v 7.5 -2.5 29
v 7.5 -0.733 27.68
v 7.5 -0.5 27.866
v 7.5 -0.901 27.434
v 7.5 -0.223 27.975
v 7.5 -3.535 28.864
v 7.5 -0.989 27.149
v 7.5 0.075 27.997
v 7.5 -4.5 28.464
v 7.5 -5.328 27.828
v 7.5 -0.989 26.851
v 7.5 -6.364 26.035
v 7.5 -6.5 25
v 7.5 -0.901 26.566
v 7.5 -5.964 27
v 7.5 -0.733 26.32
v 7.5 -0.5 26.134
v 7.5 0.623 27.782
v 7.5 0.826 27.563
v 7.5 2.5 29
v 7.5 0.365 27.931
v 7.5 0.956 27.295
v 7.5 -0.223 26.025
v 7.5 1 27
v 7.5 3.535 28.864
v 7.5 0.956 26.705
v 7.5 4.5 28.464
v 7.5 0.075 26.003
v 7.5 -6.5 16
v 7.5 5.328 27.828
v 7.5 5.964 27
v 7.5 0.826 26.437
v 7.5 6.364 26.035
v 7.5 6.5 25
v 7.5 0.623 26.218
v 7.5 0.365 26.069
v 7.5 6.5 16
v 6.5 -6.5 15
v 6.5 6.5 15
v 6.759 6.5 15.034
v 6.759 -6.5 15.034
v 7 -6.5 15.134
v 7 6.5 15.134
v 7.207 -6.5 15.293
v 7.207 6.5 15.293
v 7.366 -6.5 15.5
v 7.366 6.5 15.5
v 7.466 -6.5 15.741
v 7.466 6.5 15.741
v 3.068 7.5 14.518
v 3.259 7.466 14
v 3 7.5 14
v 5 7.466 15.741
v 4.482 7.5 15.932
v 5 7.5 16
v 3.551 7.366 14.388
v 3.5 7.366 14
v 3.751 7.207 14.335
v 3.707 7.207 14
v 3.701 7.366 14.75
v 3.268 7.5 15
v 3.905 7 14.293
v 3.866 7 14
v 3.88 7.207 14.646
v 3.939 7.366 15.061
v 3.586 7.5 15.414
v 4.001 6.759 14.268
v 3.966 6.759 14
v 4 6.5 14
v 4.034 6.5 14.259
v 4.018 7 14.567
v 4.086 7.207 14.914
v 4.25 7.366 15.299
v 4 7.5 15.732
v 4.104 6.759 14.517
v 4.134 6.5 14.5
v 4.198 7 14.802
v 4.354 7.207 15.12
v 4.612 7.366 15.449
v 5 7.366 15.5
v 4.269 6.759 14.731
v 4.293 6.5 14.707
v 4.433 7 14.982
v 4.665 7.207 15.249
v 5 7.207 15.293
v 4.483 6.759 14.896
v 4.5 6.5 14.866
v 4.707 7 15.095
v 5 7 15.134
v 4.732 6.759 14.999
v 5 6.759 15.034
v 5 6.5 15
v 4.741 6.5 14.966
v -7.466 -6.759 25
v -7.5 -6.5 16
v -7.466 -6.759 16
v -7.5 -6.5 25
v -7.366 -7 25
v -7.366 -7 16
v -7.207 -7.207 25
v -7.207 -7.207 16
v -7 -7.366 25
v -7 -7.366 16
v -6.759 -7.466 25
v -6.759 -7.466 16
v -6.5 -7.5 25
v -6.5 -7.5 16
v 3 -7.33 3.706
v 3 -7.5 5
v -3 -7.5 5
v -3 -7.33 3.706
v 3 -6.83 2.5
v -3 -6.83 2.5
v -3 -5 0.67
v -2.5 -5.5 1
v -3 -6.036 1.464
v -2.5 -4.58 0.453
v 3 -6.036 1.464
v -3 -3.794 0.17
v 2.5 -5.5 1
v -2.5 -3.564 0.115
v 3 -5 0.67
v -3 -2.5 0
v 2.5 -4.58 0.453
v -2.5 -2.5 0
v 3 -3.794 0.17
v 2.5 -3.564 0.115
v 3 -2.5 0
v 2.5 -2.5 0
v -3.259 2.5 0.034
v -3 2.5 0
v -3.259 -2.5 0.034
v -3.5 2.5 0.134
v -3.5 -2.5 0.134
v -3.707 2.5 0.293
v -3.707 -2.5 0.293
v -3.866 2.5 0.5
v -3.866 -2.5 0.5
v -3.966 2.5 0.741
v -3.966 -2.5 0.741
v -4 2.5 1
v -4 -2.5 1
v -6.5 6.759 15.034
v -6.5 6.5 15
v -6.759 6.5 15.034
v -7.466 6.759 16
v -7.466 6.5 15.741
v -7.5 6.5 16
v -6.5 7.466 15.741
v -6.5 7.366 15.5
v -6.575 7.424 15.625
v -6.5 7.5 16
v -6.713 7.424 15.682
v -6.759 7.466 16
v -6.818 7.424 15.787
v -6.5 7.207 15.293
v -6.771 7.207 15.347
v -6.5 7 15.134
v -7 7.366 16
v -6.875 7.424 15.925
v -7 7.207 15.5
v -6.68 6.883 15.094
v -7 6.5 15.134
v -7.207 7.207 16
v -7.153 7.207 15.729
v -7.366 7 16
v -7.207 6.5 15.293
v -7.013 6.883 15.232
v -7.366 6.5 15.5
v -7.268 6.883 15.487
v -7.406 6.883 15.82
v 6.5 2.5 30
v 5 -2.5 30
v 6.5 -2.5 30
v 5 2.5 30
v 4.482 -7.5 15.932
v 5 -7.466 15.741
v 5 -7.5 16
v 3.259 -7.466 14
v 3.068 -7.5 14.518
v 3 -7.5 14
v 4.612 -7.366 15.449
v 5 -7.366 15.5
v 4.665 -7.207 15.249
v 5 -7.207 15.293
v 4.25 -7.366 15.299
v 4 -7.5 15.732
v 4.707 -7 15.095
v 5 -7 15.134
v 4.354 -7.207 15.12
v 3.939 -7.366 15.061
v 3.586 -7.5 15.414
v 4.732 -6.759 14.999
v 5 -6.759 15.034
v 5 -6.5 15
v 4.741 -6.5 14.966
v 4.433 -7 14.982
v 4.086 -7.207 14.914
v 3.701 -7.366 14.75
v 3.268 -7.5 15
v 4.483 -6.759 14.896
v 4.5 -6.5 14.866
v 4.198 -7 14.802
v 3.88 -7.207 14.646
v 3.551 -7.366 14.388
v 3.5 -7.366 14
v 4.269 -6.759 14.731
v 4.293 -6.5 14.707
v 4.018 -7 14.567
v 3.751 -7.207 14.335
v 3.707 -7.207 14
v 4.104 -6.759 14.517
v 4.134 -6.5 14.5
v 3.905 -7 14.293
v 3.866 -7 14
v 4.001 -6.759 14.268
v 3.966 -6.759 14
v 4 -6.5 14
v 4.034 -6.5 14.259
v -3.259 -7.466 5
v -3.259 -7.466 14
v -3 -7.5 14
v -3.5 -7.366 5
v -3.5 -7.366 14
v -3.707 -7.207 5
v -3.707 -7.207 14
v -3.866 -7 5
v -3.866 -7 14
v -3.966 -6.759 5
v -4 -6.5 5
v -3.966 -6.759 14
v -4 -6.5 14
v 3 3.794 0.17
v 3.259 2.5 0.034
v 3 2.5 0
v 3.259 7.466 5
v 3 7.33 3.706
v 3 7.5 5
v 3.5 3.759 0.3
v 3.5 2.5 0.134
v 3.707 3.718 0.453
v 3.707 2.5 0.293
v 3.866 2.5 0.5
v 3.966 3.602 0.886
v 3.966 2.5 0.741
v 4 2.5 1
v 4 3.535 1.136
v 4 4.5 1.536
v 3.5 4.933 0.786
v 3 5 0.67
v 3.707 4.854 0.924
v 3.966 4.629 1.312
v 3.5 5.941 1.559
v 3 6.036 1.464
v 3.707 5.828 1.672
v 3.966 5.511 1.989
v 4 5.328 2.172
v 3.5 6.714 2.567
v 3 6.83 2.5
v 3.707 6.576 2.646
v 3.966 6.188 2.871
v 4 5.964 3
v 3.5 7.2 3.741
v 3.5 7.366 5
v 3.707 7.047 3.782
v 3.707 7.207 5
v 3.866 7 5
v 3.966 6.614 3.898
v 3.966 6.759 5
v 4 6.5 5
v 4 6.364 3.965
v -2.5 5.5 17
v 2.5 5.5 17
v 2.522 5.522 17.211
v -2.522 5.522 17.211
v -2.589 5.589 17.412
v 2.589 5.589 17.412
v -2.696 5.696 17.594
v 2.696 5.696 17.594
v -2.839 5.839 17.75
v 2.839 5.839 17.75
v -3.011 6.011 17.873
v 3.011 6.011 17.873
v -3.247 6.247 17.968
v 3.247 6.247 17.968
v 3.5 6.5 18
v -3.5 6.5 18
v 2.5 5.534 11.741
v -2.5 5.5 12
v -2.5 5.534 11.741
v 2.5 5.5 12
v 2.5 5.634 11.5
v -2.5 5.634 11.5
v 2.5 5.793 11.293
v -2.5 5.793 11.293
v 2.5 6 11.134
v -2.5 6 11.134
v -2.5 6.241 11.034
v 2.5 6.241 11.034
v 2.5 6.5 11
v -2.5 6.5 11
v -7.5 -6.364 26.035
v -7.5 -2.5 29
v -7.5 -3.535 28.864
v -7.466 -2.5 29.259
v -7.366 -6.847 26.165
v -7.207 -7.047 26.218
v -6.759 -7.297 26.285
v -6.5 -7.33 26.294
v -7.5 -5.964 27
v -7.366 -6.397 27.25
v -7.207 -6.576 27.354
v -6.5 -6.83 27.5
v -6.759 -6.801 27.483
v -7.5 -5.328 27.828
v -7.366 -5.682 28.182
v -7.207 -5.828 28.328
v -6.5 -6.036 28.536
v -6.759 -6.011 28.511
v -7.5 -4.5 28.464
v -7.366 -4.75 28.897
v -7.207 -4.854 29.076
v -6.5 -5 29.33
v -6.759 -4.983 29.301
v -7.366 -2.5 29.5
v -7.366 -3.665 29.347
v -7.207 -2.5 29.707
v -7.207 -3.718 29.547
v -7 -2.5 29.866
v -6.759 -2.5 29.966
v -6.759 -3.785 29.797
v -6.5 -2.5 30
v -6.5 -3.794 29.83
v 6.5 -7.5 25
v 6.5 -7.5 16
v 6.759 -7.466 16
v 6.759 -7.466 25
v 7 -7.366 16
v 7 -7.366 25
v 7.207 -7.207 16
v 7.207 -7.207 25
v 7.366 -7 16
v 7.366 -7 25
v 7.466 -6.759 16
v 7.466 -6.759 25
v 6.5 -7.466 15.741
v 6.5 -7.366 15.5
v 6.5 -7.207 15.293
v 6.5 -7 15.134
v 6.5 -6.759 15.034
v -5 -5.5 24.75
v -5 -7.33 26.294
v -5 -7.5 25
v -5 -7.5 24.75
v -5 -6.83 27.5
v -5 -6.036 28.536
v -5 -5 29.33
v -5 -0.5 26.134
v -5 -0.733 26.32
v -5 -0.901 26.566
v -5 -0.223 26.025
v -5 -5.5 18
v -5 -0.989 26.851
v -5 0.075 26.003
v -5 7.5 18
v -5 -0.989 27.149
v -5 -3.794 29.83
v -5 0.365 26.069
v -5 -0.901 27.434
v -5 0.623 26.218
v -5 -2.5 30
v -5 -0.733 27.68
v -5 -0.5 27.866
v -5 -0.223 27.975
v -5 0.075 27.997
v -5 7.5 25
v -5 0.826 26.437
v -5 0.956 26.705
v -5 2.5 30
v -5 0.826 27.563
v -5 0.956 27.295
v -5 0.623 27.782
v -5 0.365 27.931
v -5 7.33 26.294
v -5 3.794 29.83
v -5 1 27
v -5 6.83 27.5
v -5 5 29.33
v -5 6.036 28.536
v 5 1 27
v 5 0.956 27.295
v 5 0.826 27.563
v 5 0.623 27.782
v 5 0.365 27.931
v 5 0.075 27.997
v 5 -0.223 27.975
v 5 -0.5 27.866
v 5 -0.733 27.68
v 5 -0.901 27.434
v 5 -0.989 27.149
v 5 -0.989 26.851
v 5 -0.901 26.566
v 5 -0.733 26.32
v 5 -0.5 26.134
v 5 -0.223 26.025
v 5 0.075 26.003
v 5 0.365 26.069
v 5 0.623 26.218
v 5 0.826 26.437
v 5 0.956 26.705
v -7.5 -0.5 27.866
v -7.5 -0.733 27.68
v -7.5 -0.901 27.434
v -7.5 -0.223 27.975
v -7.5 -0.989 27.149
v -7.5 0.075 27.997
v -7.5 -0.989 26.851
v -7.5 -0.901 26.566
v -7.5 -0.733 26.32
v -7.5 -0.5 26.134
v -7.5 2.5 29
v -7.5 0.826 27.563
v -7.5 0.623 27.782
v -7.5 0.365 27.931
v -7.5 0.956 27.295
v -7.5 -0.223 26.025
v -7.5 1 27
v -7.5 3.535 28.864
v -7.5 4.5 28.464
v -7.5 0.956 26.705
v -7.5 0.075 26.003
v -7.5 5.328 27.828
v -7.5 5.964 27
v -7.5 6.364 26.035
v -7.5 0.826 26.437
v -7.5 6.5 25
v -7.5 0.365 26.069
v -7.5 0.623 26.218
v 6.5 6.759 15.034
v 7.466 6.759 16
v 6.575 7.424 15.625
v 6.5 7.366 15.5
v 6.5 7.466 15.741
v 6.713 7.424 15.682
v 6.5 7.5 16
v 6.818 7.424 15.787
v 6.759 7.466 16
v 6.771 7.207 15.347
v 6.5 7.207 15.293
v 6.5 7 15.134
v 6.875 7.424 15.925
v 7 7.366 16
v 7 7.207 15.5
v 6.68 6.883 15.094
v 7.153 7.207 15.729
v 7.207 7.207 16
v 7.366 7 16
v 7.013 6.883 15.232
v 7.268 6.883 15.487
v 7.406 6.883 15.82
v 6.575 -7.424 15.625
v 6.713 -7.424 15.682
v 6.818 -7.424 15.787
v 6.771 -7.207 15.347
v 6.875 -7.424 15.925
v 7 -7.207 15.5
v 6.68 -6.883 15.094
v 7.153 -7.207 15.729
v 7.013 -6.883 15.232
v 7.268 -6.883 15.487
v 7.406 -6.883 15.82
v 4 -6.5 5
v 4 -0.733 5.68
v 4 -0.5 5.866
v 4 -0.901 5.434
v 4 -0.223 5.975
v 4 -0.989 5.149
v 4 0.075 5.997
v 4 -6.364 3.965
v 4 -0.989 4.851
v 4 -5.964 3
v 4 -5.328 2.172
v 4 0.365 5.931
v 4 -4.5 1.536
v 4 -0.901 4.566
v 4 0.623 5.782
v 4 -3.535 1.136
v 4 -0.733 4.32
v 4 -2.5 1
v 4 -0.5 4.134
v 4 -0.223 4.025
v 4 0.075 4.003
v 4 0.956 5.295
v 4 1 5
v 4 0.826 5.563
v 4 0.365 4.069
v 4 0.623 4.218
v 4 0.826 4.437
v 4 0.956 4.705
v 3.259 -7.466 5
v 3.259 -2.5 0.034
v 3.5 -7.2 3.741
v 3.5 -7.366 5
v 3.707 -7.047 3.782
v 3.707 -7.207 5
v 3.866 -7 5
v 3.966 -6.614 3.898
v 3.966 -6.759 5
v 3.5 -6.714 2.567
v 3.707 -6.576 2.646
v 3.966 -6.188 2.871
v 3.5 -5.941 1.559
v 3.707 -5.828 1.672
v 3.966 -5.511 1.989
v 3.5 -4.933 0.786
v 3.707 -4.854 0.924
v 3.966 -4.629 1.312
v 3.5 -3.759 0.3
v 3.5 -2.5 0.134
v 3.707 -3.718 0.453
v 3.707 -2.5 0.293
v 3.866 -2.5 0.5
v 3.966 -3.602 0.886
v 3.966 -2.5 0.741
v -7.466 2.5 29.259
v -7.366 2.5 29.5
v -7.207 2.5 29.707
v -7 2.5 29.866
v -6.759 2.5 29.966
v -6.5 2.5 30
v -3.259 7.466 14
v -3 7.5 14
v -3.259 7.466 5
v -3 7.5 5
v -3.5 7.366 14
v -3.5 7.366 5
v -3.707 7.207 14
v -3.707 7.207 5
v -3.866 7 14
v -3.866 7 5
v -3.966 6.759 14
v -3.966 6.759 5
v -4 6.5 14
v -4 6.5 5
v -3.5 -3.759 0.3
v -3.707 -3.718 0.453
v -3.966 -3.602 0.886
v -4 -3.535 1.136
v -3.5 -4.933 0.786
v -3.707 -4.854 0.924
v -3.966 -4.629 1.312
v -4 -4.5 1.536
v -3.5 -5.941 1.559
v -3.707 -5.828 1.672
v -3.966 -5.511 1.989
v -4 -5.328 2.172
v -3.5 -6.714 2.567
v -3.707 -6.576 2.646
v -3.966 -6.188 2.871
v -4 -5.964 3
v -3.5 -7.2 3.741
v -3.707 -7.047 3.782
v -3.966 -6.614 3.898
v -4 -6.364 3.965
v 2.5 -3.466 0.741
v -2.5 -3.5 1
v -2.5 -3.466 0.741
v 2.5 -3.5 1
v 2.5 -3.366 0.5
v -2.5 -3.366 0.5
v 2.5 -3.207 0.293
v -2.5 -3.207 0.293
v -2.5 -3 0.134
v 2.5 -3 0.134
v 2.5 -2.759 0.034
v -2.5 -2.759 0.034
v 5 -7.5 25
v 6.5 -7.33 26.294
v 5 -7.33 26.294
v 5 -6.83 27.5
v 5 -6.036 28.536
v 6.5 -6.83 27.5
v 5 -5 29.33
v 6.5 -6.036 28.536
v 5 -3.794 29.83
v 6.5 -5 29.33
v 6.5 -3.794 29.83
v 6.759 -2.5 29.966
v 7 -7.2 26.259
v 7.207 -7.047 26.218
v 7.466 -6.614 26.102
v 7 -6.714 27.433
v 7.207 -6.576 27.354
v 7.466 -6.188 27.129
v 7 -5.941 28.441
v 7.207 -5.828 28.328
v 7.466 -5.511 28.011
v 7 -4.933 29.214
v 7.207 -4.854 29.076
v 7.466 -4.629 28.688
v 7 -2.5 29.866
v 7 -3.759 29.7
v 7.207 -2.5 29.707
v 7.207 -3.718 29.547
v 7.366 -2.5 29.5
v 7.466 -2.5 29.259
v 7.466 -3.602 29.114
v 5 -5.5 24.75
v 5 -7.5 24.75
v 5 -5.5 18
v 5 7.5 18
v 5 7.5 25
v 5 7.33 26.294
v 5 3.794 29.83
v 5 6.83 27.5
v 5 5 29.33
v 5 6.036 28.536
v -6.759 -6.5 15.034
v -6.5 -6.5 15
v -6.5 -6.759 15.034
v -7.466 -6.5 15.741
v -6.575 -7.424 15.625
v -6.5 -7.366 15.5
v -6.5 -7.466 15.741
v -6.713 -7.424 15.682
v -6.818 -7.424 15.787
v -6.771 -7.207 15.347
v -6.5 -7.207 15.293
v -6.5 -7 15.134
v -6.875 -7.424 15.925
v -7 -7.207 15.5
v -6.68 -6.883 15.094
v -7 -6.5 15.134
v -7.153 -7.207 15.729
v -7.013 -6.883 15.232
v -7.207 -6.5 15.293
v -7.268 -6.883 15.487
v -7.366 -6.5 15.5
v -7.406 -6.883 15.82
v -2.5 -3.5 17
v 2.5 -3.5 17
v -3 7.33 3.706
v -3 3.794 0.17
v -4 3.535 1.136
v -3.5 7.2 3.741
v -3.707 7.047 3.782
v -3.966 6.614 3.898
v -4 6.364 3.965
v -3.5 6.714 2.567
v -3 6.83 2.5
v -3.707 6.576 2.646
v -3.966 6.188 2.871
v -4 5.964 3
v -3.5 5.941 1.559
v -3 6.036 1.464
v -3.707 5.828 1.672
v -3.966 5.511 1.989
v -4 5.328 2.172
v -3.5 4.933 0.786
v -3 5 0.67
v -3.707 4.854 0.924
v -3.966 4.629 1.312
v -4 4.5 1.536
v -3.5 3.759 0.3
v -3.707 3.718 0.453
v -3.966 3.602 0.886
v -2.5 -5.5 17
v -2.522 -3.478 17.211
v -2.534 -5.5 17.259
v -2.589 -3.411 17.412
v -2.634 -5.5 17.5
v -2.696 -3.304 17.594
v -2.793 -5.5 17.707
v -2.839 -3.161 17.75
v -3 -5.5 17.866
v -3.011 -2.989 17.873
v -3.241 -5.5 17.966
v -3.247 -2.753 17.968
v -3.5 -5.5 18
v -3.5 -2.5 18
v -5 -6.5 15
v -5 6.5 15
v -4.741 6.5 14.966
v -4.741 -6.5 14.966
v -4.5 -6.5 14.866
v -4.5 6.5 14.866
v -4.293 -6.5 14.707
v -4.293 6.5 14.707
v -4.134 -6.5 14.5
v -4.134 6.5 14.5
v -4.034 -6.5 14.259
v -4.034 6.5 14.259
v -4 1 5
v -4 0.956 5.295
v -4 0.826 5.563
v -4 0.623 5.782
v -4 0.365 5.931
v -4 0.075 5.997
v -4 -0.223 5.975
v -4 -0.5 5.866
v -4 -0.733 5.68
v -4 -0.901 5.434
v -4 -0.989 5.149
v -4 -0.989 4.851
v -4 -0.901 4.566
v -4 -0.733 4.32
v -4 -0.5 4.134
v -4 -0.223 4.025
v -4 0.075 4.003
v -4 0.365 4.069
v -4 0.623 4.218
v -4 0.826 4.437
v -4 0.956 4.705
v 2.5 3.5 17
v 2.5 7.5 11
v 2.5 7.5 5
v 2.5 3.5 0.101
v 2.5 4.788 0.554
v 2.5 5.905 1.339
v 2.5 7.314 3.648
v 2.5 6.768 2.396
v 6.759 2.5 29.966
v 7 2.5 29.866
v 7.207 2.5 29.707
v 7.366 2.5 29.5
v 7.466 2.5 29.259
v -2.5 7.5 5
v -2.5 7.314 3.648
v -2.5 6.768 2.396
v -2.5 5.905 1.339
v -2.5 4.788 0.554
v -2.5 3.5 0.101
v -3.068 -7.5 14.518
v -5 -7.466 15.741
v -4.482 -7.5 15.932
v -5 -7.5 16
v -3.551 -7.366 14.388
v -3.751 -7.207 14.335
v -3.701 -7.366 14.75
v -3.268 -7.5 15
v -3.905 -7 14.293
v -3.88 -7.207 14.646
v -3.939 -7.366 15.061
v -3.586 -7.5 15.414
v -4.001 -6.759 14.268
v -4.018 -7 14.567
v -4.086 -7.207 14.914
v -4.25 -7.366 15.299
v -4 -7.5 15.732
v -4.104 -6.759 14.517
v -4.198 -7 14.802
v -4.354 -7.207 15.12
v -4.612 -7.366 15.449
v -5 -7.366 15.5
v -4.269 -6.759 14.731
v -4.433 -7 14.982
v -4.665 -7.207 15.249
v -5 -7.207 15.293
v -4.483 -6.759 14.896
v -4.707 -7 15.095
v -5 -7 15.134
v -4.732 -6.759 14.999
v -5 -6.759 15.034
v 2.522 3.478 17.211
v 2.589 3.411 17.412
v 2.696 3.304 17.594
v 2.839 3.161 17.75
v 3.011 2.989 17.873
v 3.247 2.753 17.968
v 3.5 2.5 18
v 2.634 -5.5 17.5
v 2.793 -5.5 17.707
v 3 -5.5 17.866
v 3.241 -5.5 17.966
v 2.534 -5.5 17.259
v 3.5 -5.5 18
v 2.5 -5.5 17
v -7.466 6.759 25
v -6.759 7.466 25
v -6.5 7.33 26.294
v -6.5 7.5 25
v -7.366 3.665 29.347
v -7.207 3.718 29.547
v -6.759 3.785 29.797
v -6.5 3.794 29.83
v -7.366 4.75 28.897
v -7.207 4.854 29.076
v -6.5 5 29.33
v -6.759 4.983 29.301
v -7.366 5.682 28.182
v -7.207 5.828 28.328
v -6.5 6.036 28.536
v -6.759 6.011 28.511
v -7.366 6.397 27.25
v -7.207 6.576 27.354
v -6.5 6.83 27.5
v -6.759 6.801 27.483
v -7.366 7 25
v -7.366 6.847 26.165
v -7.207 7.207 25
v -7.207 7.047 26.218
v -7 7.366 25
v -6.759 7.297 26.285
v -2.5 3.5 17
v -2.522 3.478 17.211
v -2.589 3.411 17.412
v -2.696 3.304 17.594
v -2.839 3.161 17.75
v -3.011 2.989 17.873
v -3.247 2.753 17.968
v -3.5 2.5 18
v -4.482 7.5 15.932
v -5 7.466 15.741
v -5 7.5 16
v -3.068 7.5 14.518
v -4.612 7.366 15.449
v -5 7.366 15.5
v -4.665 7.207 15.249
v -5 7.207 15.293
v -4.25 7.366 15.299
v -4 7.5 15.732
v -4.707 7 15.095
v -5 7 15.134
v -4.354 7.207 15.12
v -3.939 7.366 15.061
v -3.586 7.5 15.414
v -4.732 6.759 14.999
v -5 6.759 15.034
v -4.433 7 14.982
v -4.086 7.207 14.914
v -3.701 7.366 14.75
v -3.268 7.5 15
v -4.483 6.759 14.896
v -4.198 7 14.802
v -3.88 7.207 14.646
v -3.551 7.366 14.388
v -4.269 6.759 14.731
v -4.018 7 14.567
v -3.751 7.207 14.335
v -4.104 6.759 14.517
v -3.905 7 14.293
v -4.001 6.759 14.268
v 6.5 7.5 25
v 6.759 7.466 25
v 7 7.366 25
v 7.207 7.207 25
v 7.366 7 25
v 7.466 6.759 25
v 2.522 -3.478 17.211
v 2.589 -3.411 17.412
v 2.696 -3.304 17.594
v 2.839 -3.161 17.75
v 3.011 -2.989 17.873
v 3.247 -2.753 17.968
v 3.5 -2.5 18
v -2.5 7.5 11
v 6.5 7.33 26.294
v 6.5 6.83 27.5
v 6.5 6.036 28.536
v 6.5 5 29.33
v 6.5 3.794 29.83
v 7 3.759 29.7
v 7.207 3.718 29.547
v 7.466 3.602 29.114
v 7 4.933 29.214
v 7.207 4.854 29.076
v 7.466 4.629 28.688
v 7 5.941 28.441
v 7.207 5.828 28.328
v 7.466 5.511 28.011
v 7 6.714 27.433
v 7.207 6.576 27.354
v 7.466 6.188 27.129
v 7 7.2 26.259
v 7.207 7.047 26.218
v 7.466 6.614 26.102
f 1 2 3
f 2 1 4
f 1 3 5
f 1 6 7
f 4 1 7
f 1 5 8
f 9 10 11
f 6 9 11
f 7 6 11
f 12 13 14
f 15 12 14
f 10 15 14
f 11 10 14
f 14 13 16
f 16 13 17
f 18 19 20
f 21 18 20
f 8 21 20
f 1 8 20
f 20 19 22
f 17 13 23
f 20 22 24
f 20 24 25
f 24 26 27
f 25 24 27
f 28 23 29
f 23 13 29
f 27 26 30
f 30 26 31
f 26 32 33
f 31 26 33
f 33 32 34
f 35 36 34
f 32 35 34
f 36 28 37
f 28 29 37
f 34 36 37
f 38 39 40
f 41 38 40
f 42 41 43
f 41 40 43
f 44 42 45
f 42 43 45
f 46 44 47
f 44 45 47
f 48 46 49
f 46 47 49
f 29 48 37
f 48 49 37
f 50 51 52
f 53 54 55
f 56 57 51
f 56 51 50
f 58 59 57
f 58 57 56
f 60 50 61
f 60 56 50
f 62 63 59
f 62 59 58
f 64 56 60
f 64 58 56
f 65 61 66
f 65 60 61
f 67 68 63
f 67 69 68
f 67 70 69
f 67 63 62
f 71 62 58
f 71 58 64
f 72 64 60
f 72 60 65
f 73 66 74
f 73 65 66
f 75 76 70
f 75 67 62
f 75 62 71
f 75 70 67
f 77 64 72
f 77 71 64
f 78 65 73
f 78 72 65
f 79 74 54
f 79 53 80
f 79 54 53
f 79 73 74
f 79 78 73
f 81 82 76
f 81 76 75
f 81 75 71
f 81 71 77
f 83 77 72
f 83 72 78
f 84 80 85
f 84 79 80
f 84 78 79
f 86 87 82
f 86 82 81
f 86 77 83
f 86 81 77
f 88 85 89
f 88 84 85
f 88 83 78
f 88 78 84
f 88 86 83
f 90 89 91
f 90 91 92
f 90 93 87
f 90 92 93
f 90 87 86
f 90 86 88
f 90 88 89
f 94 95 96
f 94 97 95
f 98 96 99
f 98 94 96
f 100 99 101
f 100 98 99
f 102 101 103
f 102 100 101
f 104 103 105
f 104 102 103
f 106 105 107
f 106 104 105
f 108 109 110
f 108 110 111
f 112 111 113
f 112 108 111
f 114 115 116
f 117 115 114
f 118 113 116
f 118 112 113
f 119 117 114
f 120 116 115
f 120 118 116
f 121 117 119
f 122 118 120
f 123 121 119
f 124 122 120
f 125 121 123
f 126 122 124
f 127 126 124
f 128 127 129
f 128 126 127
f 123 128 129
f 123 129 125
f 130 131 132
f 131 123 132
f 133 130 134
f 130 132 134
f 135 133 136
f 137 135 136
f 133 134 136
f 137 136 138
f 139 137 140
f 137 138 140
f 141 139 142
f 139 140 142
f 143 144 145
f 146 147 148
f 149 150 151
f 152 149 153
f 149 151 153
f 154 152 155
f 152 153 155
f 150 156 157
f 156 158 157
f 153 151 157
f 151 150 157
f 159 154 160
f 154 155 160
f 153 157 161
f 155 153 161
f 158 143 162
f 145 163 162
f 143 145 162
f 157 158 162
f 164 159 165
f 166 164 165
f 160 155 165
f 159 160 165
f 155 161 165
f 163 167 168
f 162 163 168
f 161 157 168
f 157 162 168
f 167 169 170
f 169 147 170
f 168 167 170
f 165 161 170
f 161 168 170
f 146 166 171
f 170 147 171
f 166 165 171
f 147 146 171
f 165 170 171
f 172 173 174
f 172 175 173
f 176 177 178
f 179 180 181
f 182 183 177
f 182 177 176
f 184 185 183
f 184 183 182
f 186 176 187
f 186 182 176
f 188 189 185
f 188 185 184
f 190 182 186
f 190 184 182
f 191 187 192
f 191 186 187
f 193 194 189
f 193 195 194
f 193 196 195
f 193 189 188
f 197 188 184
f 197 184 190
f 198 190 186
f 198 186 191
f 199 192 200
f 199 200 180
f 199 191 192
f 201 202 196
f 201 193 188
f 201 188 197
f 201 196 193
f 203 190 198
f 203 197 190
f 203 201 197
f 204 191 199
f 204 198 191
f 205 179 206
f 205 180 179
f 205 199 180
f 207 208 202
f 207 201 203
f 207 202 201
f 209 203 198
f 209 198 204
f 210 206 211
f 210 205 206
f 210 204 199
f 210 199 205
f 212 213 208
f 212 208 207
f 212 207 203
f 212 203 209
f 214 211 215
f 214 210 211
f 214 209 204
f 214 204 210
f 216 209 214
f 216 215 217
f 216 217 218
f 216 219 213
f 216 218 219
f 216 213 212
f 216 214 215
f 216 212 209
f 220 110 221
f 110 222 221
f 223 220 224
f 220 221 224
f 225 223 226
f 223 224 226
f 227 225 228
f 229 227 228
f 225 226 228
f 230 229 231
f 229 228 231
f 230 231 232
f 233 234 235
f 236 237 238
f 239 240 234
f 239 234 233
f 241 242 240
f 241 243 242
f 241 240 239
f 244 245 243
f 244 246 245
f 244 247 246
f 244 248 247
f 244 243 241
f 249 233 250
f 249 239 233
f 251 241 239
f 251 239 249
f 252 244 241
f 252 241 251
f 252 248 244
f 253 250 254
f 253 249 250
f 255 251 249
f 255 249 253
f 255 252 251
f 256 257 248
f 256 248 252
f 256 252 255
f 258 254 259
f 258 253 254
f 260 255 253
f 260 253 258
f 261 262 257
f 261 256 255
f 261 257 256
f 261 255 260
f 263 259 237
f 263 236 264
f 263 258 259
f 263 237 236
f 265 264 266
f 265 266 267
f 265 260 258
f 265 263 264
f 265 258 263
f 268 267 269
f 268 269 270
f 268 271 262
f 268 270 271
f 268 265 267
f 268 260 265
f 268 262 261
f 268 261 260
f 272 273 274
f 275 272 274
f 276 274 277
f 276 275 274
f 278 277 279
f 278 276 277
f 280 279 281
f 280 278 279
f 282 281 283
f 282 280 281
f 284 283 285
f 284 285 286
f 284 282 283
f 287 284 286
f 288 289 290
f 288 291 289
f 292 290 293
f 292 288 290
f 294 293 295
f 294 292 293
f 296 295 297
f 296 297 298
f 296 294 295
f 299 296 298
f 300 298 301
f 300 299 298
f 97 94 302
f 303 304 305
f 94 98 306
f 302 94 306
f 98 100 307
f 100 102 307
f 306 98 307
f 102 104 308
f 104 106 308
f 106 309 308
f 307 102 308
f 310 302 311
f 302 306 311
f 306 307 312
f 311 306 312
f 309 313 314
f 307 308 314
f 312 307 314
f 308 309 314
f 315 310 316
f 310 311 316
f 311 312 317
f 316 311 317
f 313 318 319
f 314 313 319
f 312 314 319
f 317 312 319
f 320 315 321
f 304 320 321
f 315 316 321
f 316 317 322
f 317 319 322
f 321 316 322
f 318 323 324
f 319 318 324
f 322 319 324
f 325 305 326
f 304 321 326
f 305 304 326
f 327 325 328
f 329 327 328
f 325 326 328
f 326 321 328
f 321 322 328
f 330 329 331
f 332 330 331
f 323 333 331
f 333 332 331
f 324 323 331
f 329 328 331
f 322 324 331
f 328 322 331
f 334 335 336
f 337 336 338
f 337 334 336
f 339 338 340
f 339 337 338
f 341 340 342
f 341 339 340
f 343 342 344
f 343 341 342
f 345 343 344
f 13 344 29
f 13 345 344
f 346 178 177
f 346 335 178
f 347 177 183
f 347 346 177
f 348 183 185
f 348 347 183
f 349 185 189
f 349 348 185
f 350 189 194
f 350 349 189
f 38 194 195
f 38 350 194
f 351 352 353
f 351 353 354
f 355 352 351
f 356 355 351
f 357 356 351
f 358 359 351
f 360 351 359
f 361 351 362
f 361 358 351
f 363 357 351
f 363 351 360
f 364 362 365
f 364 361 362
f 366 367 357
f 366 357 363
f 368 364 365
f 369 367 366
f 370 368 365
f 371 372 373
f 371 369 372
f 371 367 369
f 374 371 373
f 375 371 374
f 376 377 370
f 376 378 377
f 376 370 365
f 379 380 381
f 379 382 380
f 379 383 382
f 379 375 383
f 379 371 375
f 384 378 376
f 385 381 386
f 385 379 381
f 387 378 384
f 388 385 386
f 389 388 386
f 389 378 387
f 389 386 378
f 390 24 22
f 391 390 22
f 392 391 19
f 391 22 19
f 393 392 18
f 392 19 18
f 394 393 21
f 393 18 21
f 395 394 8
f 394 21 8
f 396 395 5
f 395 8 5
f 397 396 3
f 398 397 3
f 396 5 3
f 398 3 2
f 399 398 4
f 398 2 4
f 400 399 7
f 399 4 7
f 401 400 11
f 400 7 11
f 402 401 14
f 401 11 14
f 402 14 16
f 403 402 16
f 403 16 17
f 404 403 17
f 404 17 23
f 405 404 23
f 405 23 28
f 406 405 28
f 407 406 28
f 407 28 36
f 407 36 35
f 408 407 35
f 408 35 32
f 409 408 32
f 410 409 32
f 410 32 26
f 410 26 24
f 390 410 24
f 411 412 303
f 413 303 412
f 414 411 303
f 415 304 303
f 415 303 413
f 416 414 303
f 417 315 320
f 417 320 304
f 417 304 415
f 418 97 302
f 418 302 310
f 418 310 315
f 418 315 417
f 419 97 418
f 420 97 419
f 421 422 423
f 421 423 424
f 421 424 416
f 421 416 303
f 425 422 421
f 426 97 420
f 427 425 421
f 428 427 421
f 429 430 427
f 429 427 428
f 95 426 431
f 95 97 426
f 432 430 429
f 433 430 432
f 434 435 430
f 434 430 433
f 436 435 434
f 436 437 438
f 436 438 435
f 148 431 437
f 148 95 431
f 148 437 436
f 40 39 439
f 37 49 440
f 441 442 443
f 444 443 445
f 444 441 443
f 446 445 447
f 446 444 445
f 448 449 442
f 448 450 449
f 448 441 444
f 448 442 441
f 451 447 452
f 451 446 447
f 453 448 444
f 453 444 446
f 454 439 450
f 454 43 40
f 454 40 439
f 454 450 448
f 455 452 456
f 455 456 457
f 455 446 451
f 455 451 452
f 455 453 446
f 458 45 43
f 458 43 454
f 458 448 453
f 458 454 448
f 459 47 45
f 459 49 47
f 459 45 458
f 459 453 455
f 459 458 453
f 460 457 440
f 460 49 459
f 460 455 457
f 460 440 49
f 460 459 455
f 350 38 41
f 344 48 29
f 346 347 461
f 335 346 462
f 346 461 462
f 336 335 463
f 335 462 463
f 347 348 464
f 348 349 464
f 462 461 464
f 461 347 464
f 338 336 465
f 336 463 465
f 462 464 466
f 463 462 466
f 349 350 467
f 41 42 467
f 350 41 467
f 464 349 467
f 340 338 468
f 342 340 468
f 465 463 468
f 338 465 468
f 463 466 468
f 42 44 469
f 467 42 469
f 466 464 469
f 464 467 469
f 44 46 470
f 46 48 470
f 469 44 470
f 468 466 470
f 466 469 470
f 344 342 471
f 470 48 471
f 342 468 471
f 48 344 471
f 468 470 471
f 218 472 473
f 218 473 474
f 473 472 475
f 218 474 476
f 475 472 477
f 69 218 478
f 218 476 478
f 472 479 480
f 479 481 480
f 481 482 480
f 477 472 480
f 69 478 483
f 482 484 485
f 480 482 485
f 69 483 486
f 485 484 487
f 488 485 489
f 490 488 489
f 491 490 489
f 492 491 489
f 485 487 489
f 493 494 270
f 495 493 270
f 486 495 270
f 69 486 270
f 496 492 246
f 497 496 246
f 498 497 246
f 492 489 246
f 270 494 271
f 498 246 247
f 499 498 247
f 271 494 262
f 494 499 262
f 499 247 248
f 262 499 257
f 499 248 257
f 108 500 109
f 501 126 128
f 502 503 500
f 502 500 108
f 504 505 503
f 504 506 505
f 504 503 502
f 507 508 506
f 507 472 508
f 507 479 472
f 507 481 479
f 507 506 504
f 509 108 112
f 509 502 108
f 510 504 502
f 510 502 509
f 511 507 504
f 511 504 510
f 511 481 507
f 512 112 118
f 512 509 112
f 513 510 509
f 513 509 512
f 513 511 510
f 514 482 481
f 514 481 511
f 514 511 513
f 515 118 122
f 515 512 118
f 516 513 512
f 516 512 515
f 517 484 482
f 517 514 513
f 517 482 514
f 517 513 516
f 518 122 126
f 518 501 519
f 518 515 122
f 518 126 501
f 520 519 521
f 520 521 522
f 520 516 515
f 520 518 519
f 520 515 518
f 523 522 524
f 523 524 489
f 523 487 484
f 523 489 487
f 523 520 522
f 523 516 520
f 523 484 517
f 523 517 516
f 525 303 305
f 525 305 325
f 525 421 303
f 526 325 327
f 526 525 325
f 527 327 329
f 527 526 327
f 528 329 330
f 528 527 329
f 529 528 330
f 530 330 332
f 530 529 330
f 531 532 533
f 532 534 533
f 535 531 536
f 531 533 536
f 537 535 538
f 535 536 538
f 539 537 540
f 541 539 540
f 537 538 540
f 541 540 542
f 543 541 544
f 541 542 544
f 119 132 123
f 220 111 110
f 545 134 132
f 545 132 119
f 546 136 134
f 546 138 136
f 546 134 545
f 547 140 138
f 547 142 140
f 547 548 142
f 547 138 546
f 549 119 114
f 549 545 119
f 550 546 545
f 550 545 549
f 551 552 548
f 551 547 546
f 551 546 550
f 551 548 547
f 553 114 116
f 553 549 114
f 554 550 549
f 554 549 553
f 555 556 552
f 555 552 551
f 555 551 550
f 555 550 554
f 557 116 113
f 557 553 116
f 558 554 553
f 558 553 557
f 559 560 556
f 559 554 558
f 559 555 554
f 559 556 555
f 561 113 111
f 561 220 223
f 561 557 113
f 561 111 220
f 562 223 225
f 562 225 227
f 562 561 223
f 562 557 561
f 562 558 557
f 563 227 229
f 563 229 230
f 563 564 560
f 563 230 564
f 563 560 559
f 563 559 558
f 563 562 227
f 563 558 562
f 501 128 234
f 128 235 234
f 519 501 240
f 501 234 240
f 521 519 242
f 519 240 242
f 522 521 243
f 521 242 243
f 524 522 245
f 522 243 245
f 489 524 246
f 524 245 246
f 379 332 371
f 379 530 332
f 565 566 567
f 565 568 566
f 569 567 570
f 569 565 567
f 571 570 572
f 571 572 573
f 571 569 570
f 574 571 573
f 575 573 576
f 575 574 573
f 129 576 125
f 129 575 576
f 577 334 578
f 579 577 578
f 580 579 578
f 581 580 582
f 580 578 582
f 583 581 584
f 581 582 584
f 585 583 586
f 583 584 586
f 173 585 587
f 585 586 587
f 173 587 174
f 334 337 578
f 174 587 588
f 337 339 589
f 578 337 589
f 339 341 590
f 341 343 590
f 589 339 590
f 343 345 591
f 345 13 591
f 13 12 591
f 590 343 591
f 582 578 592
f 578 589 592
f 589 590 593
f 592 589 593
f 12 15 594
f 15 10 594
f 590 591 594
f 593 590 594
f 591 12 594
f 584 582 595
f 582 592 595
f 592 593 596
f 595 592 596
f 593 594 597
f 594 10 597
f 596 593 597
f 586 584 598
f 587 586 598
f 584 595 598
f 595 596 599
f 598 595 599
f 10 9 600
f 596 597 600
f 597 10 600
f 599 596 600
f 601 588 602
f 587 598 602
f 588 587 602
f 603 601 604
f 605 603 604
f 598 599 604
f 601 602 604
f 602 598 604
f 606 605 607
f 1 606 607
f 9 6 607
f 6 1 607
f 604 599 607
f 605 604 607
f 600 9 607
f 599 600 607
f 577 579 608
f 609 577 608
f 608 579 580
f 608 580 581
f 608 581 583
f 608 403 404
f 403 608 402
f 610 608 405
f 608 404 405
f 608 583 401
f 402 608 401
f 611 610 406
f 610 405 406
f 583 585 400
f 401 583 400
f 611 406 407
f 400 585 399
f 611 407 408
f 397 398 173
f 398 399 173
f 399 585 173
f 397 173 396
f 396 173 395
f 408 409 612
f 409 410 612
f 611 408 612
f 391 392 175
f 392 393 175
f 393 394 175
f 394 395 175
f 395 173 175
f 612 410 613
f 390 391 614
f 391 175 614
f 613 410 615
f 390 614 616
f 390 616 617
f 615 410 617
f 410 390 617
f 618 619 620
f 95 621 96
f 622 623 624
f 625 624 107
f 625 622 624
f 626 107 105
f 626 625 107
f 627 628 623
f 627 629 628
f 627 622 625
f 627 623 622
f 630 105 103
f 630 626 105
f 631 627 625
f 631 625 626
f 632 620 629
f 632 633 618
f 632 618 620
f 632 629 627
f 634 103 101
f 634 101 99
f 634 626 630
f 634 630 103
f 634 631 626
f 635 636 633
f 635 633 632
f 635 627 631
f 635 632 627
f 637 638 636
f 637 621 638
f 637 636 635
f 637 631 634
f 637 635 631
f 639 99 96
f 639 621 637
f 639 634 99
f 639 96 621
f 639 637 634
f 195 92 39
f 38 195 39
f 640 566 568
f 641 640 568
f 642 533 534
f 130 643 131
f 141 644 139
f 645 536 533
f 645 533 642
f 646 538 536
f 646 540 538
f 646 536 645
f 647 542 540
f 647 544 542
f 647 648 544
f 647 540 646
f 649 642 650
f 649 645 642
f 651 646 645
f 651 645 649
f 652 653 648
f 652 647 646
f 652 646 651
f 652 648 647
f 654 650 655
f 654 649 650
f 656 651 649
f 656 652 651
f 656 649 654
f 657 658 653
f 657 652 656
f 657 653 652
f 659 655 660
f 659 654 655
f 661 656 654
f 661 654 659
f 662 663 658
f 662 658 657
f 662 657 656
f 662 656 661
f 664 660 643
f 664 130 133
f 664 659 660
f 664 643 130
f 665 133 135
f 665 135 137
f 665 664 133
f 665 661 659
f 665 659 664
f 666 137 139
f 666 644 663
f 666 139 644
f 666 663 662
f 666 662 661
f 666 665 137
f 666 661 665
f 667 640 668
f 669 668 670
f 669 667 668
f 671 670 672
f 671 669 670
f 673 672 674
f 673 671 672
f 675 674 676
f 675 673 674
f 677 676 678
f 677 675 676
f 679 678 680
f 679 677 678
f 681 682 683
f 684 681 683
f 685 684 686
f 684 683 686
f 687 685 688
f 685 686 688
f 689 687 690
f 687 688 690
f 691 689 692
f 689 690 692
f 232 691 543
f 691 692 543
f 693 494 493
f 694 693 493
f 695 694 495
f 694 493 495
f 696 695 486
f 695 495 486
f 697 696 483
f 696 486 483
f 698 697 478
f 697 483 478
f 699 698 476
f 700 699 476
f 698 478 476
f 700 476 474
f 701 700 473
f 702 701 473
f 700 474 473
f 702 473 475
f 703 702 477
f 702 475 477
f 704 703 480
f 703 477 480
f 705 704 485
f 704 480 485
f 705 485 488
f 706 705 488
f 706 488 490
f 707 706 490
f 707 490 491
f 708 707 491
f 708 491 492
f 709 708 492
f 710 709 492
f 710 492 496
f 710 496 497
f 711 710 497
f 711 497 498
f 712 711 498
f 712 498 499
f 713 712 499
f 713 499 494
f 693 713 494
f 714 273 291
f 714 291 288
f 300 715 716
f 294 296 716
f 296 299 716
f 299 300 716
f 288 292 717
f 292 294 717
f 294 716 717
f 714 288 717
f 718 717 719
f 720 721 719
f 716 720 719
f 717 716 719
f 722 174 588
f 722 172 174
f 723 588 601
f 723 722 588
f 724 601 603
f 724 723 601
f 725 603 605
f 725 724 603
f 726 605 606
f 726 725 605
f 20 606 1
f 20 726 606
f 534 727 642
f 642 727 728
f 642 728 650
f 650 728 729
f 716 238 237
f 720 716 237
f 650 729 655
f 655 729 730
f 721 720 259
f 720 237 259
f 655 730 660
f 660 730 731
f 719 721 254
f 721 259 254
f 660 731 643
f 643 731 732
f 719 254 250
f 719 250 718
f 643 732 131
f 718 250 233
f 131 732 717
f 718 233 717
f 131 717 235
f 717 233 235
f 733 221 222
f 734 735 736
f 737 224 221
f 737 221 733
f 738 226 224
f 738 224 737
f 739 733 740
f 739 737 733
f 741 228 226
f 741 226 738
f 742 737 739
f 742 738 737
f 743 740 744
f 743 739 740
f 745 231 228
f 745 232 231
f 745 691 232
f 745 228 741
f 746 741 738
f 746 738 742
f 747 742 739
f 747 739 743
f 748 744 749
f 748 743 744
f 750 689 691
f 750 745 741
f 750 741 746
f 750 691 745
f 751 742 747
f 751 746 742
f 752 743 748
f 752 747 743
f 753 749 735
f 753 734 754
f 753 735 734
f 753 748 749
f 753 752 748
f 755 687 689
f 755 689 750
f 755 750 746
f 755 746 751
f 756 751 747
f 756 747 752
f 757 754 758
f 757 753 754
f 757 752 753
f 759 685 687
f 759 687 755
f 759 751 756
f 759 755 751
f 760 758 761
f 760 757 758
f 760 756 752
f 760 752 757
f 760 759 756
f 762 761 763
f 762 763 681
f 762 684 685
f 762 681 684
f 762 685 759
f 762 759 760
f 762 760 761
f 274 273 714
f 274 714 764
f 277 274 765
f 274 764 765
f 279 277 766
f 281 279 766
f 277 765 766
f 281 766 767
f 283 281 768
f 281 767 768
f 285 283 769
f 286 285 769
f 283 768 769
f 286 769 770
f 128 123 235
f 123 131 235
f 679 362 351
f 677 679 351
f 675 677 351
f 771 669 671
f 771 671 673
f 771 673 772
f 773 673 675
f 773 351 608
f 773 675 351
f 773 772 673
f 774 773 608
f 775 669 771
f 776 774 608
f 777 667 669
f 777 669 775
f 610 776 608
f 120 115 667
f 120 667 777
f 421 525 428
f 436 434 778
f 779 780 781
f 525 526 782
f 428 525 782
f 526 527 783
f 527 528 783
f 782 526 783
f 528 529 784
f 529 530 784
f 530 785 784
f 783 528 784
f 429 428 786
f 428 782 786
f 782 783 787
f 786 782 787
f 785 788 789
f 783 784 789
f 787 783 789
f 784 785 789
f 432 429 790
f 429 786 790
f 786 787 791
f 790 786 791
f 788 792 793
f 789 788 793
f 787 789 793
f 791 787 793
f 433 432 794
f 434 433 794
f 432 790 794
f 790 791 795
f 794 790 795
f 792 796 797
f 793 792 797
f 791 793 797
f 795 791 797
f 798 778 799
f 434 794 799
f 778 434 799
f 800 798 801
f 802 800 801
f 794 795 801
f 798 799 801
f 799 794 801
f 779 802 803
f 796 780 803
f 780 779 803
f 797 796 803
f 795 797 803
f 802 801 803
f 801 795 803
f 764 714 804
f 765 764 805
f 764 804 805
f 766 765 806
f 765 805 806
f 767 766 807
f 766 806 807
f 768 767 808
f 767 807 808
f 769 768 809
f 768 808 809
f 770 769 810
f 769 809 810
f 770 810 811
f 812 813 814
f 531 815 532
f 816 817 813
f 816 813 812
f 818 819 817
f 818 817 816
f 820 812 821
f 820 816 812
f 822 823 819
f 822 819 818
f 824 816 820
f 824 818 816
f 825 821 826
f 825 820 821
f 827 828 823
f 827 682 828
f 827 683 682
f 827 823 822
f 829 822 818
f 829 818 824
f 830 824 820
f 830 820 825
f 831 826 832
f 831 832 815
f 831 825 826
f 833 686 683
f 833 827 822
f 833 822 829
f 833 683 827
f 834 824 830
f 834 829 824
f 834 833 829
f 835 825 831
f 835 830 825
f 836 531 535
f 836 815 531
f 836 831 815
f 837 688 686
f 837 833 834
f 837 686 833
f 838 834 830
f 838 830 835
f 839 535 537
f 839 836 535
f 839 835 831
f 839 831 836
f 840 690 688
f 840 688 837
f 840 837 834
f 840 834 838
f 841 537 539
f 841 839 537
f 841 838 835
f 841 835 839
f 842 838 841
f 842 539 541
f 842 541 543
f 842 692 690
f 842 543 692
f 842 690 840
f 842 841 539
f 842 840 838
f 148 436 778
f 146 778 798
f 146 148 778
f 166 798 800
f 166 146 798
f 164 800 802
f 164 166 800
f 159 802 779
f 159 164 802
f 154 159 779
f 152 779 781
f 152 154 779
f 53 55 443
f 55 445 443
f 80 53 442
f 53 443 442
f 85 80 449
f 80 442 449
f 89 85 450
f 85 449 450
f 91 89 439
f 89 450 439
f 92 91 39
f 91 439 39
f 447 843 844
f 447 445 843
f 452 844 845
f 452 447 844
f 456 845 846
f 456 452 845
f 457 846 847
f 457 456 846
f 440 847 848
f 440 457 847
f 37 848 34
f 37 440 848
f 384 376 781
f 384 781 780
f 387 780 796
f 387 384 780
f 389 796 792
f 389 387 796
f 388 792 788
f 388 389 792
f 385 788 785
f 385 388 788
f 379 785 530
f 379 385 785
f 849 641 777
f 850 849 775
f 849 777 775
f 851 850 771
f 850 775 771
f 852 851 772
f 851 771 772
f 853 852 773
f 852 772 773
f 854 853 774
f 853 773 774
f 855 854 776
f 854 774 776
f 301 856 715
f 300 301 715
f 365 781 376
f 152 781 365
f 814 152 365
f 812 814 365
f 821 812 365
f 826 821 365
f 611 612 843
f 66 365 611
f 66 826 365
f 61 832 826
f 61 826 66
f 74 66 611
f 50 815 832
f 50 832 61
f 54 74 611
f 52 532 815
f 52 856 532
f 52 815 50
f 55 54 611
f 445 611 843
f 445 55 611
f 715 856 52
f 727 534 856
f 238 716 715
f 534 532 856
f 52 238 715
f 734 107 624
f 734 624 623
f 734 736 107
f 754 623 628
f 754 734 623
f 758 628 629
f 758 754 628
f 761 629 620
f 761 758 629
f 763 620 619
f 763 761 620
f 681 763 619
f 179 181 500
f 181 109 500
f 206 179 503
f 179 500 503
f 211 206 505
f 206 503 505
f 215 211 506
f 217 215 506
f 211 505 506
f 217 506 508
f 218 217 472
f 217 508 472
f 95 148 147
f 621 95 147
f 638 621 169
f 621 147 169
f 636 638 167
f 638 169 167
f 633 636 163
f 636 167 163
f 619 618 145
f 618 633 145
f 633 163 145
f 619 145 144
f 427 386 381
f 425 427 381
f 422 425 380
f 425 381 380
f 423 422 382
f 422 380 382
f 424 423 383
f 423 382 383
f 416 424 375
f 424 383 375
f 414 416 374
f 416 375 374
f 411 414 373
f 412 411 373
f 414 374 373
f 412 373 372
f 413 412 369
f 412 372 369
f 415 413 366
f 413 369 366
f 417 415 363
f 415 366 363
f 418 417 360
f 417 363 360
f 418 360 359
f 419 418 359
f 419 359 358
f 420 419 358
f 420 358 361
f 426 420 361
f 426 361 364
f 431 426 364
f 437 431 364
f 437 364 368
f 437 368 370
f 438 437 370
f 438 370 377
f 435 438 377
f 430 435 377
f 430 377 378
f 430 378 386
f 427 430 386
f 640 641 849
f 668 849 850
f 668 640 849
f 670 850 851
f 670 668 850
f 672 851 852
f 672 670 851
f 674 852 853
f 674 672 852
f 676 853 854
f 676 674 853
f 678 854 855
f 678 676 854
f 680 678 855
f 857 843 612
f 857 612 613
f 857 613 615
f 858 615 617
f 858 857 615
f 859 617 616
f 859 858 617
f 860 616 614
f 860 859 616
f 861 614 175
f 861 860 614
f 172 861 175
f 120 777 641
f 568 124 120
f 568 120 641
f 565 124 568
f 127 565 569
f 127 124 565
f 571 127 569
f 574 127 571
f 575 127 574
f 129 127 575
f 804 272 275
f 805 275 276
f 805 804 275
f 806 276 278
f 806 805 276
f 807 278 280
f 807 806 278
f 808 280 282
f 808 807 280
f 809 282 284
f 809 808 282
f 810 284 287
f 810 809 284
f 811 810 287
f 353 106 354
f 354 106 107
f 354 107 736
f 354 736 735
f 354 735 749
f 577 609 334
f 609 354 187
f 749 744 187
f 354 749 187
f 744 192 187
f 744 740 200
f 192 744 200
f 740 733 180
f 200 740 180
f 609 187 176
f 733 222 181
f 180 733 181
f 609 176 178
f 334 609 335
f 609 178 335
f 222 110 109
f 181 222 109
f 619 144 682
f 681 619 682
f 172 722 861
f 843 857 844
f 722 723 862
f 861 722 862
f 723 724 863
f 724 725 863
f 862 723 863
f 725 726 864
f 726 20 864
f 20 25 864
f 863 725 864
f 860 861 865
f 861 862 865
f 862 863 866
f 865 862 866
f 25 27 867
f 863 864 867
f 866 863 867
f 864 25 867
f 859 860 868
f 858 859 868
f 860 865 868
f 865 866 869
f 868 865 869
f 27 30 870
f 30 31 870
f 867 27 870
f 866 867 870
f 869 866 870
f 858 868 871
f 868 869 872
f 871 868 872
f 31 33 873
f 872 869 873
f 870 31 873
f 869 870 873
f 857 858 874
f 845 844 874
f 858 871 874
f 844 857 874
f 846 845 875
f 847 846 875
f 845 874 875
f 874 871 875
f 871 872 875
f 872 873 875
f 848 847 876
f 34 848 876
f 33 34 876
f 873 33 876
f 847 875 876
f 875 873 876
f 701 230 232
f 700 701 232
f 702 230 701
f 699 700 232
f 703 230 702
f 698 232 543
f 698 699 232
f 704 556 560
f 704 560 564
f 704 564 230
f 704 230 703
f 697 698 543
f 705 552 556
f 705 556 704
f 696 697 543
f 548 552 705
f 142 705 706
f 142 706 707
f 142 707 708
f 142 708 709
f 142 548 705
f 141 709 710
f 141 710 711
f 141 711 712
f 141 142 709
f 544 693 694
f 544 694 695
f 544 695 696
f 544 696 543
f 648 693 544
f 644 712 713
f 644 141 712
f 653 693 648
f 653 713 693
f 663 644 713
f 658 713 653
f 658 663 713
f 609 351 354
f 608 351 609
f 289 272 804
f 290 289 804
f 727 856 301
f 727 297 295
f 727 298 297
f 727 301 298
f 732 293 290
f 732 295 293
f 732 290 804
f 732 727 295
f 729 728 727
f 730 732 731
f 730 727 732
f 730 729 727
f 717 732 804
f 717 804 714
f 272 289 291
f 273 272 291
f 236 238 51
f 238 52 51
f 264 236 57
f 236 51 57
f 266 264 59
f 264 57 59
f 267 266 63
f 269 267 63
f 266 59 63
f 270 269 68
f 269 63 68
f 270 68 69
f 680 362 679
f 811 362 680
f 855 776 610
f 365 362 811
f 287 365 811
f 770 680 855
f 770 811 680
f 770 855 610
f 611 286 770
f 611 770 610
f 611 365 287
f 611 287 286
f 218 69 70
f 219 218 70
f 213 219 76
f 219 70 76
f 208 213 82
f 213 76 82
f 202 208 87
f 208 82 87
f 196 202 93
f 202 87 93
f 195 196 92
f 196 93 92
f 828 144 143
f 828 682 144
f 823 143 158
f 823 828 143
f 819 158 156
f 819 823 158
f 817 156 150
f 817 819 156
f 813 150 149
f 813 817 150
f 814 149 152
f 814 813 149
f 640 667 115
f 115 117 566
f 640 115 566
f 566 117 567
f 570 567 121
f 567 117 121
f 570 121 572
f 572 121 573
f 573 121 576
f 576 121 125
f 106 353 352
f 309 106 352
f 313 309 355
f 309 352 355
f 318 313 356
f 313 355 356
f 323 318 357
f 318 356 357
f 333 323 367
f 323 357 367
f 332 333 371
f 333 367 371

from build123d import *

# Parameters (mm, degrees)
BASE_SKETCH_W                    = 15
BASE_SKETCH_H                    = 15
BASE_SKETCH_EXTRUDE_DEPTH        = 30
CENTER_NUB_CUTOUT_SKETCH_W       = 3.5
CENTER_NUB_CUTOUT_SKETCH_H       = 15
HINGE_NUB_EXTRUDED_CUT_DEPTH     = 15
HINGE_CUTOUT_SKETCH_W            = 10
HINGE_CUTOUT_SKETCH_H            = 15
HINGE_CUTOUT_EXTRUDED_CUT_DEPTH  = 12
HINGE_HOLE_SKETCH_R              = 1
HINGE_HOLE_EXTRUDED_CUT_DEPTH    = 35.369317712
CORNER_FILLETS_R                 = 5
STYLE_FILLETS_R                  = 1
ROUTING_HOLES_SKETCH_W           = 5
ROUTING_HOLES_SKETCH_H           = 2
ROUTING_HOLES_EXTRUDED_CUT_DEPTH = 32.819805153
SKETCH1_W                        = 10
SKETCH1_H                        = 2
BACKING_EXTRUDE_DEPTH            = 6.75
EXTRA_ROUTING_CUT_SKETCH_W       = 5
EXTRA_ROUTING_CUT_SKETCH_H       = 10
EXTRA_ROUTING_EXTRUDED_CUT_DEPTH = 4
ROUTING_FILLETS_R                = 1


with BuildPart() as part:
    # Base Sketch → Base Sketch Extrude (new body)
    with BuildSketch(Plane.XY):
        Rectangle(BASE_SKETCH_W, BASE_SKETCH_H)
    extrude(amount=BASE_SKETCH_EXTRUDE_DEPTH)

    # Center Nub Cutout Sketch → Hinge Nub Extruded Cut (cut)
    with BuildSketch(Plane.XY):
        with Locations((5.75, 0)):
            Rectangle(CENTER_NUB_CUTOUT_SKETCH_W, CENTER_NUB_CUTOUT_SKETCH_H)
        with Locations((-5.75, 0)):
            Rectangle(CENTER_NUB_CUTOUT_SKETCH_W, CENTER_NUB_CUTOUT_SKETCH_H)
    extrude(amount=HINGE_NUB_EXTRUDED_CUT_DEPTH, mode=Mode.SUBTRACT)

    # Hinge Cutout Sketch → Hinge Cutout Extruded Cut (cut)
    with BuildSketch(Plane.XY.offset(30)):
        Rectangle(HINGE_CUTOUT_SKETCH_W, HINGE_CUTOUT_SKETCH_H)
    extrude(amount=-HINGE_CUTOUT_EXTRUDED_CUT_DEPTH, mode=Mode.SUBTRACT)

    # Hinge Hole Sketch → Hinge Hole Extruded Cut (cut, through all)
    with BuildSketch(Plane(origin=(7.5, 0, 0), x_dir=(0, 0, -1), z_dir=(1, 0, 0))):
        with Locations(Location((-5, 0, 0), (0, 0, 90))):
            Circle(HINGE_HOLE_SKETCH_R)
        with Locations(Location((-27, 0, 0), (0, 0, 90))):
            Circle(HINGE_HOLE_SKETCH_R)
    extrude(amount=-HINGE_HOLE_EXTRUDED_CUT_DEPTH, mode=Mode.SUBTRACT)

    # Corner Fillets
    corner_fillets_edges = [part.edges().sort_by_distance(p)[0] for p in [
        (0, -7.5, 0),
        (0, 7.5, 0),
        (-6.25, -7.5, 30),
        (-6.25, 7.5, 30),
        (6.25, -7.5, 30),
        (6.25, 7.5, 30),
    ]]
    fillet(corner_fillets_edges, radius=CORNER_FILLETS_R)

    # Style Fillets
    style_fillets_edges = [part.edges().sort_by_distance(p)[0] for p in [
        (4, 7.5, 10),
        (4, -7.5, 10),
        (7.5, 0, 15),
        (5.75, 7.5, 15),
        (4, 0, 15),
        (5.75, -7.5, 15),
        (-4, -7.5, 10),
        (-4, 7.5, 10),
        (-7.5, 0, 15),
        (-5.75, -7.5, 15),
        (-4, 0, 15),
        (-5.75, 7.5, 15),
        (-7.5, 0, 30),
        (-7.5, -7.5, 20),
        (7.5, -7.5, 20),
        (-7.5, 7.5, 20),
        (-7.5, 6.035533906, 28.535533906),
        (-7.5, -6.035533906, 28.535533906),
        (7.5, 7.5, 20),
        (7.5, 0, 30),
        (7.5, 6.035533906, 28.535533906),
        (7.5, -6.035533906, 28.535533906),
        (4, 0, 0),
        (4, 6.035533906, 1.464466094),
        (4, -6.035533906, 1.464466094),
        (-4, 0, 0),
        (-4, 6.035533906, 1.464466094),
        (-4, -6.035533906, 1.464466094),
    ]]
    fillet(style_fillets_edges, radius=STYLE_FILLETS_R)

    # Routing Holes Sketch → Routing Holes Extruded Cut (cut, through all)
    with BuildSketch(Plane.XY):
        with Locations((0, 4.5)):
            Rectangle(ROUTING_HOLES_SKETCH_W, ROUTING_HOLES_SKETCH_H)
        with Locations((0, -4.5)):
            Rectangle(ROUTING_HOLES_SKETCH_W, ROUTING_HOLES_SKETCH_H)
    extrude(amount=ROUTING_HOLES_EXTRUDED_CUT_DEPTH, mode=Mode.SUBTRACT)

    # Sketch1 → Backing Extrude (add)
    with BuildSketch(Plane.XY.offset(18)):
        with Locations((0, -6.5)):
            Rectangle(SKETCH1_W, SKETCH1_H)
    extrude(amount=BACKING_EXTRUDE_DEPTH)

    # Extra Routing Cut Sketch → Extra Routing Extruded Cut (cut)
    with BuildSketch(Plane(origin=(0, 7.5, 0), x_dir=(1, 0, 0), z_dir=(0, 1, 0))):
        with Locations((0, -6)):
            Rectangle(EXTRA_ROUTING_CUT_SKETCH_W, EXTRA_ROUTING_CUT_SKETCH_H)
    extrude(amount=-EXTRA_ROUTING_EXTRUDED_CUT_DEPTH, mode=Mode.SUBTRACT)

    # Routing Fillets
    routing_fillets_edges = [part.edges().sort_by_distance(p)[0] for p in [
        (0, -3.5, 0.101020514),
        (-2.5, 4.5, 18),
        (0, 3.5, 18),
        (2.5, 4.5, 18),
        (0, 5.5, 18),
        (2.5, -4.5, 18),
        (0, -3.5, 18),
        (-2.5, -4.5, 18),
        (0, 5.5, 11),
    ]]
    fillet(routing_fillets_edges, radius=ROUTING_FILLETS_R - 0.0001)  # a hair under: the kernel refuses the full size


solid = part.part
